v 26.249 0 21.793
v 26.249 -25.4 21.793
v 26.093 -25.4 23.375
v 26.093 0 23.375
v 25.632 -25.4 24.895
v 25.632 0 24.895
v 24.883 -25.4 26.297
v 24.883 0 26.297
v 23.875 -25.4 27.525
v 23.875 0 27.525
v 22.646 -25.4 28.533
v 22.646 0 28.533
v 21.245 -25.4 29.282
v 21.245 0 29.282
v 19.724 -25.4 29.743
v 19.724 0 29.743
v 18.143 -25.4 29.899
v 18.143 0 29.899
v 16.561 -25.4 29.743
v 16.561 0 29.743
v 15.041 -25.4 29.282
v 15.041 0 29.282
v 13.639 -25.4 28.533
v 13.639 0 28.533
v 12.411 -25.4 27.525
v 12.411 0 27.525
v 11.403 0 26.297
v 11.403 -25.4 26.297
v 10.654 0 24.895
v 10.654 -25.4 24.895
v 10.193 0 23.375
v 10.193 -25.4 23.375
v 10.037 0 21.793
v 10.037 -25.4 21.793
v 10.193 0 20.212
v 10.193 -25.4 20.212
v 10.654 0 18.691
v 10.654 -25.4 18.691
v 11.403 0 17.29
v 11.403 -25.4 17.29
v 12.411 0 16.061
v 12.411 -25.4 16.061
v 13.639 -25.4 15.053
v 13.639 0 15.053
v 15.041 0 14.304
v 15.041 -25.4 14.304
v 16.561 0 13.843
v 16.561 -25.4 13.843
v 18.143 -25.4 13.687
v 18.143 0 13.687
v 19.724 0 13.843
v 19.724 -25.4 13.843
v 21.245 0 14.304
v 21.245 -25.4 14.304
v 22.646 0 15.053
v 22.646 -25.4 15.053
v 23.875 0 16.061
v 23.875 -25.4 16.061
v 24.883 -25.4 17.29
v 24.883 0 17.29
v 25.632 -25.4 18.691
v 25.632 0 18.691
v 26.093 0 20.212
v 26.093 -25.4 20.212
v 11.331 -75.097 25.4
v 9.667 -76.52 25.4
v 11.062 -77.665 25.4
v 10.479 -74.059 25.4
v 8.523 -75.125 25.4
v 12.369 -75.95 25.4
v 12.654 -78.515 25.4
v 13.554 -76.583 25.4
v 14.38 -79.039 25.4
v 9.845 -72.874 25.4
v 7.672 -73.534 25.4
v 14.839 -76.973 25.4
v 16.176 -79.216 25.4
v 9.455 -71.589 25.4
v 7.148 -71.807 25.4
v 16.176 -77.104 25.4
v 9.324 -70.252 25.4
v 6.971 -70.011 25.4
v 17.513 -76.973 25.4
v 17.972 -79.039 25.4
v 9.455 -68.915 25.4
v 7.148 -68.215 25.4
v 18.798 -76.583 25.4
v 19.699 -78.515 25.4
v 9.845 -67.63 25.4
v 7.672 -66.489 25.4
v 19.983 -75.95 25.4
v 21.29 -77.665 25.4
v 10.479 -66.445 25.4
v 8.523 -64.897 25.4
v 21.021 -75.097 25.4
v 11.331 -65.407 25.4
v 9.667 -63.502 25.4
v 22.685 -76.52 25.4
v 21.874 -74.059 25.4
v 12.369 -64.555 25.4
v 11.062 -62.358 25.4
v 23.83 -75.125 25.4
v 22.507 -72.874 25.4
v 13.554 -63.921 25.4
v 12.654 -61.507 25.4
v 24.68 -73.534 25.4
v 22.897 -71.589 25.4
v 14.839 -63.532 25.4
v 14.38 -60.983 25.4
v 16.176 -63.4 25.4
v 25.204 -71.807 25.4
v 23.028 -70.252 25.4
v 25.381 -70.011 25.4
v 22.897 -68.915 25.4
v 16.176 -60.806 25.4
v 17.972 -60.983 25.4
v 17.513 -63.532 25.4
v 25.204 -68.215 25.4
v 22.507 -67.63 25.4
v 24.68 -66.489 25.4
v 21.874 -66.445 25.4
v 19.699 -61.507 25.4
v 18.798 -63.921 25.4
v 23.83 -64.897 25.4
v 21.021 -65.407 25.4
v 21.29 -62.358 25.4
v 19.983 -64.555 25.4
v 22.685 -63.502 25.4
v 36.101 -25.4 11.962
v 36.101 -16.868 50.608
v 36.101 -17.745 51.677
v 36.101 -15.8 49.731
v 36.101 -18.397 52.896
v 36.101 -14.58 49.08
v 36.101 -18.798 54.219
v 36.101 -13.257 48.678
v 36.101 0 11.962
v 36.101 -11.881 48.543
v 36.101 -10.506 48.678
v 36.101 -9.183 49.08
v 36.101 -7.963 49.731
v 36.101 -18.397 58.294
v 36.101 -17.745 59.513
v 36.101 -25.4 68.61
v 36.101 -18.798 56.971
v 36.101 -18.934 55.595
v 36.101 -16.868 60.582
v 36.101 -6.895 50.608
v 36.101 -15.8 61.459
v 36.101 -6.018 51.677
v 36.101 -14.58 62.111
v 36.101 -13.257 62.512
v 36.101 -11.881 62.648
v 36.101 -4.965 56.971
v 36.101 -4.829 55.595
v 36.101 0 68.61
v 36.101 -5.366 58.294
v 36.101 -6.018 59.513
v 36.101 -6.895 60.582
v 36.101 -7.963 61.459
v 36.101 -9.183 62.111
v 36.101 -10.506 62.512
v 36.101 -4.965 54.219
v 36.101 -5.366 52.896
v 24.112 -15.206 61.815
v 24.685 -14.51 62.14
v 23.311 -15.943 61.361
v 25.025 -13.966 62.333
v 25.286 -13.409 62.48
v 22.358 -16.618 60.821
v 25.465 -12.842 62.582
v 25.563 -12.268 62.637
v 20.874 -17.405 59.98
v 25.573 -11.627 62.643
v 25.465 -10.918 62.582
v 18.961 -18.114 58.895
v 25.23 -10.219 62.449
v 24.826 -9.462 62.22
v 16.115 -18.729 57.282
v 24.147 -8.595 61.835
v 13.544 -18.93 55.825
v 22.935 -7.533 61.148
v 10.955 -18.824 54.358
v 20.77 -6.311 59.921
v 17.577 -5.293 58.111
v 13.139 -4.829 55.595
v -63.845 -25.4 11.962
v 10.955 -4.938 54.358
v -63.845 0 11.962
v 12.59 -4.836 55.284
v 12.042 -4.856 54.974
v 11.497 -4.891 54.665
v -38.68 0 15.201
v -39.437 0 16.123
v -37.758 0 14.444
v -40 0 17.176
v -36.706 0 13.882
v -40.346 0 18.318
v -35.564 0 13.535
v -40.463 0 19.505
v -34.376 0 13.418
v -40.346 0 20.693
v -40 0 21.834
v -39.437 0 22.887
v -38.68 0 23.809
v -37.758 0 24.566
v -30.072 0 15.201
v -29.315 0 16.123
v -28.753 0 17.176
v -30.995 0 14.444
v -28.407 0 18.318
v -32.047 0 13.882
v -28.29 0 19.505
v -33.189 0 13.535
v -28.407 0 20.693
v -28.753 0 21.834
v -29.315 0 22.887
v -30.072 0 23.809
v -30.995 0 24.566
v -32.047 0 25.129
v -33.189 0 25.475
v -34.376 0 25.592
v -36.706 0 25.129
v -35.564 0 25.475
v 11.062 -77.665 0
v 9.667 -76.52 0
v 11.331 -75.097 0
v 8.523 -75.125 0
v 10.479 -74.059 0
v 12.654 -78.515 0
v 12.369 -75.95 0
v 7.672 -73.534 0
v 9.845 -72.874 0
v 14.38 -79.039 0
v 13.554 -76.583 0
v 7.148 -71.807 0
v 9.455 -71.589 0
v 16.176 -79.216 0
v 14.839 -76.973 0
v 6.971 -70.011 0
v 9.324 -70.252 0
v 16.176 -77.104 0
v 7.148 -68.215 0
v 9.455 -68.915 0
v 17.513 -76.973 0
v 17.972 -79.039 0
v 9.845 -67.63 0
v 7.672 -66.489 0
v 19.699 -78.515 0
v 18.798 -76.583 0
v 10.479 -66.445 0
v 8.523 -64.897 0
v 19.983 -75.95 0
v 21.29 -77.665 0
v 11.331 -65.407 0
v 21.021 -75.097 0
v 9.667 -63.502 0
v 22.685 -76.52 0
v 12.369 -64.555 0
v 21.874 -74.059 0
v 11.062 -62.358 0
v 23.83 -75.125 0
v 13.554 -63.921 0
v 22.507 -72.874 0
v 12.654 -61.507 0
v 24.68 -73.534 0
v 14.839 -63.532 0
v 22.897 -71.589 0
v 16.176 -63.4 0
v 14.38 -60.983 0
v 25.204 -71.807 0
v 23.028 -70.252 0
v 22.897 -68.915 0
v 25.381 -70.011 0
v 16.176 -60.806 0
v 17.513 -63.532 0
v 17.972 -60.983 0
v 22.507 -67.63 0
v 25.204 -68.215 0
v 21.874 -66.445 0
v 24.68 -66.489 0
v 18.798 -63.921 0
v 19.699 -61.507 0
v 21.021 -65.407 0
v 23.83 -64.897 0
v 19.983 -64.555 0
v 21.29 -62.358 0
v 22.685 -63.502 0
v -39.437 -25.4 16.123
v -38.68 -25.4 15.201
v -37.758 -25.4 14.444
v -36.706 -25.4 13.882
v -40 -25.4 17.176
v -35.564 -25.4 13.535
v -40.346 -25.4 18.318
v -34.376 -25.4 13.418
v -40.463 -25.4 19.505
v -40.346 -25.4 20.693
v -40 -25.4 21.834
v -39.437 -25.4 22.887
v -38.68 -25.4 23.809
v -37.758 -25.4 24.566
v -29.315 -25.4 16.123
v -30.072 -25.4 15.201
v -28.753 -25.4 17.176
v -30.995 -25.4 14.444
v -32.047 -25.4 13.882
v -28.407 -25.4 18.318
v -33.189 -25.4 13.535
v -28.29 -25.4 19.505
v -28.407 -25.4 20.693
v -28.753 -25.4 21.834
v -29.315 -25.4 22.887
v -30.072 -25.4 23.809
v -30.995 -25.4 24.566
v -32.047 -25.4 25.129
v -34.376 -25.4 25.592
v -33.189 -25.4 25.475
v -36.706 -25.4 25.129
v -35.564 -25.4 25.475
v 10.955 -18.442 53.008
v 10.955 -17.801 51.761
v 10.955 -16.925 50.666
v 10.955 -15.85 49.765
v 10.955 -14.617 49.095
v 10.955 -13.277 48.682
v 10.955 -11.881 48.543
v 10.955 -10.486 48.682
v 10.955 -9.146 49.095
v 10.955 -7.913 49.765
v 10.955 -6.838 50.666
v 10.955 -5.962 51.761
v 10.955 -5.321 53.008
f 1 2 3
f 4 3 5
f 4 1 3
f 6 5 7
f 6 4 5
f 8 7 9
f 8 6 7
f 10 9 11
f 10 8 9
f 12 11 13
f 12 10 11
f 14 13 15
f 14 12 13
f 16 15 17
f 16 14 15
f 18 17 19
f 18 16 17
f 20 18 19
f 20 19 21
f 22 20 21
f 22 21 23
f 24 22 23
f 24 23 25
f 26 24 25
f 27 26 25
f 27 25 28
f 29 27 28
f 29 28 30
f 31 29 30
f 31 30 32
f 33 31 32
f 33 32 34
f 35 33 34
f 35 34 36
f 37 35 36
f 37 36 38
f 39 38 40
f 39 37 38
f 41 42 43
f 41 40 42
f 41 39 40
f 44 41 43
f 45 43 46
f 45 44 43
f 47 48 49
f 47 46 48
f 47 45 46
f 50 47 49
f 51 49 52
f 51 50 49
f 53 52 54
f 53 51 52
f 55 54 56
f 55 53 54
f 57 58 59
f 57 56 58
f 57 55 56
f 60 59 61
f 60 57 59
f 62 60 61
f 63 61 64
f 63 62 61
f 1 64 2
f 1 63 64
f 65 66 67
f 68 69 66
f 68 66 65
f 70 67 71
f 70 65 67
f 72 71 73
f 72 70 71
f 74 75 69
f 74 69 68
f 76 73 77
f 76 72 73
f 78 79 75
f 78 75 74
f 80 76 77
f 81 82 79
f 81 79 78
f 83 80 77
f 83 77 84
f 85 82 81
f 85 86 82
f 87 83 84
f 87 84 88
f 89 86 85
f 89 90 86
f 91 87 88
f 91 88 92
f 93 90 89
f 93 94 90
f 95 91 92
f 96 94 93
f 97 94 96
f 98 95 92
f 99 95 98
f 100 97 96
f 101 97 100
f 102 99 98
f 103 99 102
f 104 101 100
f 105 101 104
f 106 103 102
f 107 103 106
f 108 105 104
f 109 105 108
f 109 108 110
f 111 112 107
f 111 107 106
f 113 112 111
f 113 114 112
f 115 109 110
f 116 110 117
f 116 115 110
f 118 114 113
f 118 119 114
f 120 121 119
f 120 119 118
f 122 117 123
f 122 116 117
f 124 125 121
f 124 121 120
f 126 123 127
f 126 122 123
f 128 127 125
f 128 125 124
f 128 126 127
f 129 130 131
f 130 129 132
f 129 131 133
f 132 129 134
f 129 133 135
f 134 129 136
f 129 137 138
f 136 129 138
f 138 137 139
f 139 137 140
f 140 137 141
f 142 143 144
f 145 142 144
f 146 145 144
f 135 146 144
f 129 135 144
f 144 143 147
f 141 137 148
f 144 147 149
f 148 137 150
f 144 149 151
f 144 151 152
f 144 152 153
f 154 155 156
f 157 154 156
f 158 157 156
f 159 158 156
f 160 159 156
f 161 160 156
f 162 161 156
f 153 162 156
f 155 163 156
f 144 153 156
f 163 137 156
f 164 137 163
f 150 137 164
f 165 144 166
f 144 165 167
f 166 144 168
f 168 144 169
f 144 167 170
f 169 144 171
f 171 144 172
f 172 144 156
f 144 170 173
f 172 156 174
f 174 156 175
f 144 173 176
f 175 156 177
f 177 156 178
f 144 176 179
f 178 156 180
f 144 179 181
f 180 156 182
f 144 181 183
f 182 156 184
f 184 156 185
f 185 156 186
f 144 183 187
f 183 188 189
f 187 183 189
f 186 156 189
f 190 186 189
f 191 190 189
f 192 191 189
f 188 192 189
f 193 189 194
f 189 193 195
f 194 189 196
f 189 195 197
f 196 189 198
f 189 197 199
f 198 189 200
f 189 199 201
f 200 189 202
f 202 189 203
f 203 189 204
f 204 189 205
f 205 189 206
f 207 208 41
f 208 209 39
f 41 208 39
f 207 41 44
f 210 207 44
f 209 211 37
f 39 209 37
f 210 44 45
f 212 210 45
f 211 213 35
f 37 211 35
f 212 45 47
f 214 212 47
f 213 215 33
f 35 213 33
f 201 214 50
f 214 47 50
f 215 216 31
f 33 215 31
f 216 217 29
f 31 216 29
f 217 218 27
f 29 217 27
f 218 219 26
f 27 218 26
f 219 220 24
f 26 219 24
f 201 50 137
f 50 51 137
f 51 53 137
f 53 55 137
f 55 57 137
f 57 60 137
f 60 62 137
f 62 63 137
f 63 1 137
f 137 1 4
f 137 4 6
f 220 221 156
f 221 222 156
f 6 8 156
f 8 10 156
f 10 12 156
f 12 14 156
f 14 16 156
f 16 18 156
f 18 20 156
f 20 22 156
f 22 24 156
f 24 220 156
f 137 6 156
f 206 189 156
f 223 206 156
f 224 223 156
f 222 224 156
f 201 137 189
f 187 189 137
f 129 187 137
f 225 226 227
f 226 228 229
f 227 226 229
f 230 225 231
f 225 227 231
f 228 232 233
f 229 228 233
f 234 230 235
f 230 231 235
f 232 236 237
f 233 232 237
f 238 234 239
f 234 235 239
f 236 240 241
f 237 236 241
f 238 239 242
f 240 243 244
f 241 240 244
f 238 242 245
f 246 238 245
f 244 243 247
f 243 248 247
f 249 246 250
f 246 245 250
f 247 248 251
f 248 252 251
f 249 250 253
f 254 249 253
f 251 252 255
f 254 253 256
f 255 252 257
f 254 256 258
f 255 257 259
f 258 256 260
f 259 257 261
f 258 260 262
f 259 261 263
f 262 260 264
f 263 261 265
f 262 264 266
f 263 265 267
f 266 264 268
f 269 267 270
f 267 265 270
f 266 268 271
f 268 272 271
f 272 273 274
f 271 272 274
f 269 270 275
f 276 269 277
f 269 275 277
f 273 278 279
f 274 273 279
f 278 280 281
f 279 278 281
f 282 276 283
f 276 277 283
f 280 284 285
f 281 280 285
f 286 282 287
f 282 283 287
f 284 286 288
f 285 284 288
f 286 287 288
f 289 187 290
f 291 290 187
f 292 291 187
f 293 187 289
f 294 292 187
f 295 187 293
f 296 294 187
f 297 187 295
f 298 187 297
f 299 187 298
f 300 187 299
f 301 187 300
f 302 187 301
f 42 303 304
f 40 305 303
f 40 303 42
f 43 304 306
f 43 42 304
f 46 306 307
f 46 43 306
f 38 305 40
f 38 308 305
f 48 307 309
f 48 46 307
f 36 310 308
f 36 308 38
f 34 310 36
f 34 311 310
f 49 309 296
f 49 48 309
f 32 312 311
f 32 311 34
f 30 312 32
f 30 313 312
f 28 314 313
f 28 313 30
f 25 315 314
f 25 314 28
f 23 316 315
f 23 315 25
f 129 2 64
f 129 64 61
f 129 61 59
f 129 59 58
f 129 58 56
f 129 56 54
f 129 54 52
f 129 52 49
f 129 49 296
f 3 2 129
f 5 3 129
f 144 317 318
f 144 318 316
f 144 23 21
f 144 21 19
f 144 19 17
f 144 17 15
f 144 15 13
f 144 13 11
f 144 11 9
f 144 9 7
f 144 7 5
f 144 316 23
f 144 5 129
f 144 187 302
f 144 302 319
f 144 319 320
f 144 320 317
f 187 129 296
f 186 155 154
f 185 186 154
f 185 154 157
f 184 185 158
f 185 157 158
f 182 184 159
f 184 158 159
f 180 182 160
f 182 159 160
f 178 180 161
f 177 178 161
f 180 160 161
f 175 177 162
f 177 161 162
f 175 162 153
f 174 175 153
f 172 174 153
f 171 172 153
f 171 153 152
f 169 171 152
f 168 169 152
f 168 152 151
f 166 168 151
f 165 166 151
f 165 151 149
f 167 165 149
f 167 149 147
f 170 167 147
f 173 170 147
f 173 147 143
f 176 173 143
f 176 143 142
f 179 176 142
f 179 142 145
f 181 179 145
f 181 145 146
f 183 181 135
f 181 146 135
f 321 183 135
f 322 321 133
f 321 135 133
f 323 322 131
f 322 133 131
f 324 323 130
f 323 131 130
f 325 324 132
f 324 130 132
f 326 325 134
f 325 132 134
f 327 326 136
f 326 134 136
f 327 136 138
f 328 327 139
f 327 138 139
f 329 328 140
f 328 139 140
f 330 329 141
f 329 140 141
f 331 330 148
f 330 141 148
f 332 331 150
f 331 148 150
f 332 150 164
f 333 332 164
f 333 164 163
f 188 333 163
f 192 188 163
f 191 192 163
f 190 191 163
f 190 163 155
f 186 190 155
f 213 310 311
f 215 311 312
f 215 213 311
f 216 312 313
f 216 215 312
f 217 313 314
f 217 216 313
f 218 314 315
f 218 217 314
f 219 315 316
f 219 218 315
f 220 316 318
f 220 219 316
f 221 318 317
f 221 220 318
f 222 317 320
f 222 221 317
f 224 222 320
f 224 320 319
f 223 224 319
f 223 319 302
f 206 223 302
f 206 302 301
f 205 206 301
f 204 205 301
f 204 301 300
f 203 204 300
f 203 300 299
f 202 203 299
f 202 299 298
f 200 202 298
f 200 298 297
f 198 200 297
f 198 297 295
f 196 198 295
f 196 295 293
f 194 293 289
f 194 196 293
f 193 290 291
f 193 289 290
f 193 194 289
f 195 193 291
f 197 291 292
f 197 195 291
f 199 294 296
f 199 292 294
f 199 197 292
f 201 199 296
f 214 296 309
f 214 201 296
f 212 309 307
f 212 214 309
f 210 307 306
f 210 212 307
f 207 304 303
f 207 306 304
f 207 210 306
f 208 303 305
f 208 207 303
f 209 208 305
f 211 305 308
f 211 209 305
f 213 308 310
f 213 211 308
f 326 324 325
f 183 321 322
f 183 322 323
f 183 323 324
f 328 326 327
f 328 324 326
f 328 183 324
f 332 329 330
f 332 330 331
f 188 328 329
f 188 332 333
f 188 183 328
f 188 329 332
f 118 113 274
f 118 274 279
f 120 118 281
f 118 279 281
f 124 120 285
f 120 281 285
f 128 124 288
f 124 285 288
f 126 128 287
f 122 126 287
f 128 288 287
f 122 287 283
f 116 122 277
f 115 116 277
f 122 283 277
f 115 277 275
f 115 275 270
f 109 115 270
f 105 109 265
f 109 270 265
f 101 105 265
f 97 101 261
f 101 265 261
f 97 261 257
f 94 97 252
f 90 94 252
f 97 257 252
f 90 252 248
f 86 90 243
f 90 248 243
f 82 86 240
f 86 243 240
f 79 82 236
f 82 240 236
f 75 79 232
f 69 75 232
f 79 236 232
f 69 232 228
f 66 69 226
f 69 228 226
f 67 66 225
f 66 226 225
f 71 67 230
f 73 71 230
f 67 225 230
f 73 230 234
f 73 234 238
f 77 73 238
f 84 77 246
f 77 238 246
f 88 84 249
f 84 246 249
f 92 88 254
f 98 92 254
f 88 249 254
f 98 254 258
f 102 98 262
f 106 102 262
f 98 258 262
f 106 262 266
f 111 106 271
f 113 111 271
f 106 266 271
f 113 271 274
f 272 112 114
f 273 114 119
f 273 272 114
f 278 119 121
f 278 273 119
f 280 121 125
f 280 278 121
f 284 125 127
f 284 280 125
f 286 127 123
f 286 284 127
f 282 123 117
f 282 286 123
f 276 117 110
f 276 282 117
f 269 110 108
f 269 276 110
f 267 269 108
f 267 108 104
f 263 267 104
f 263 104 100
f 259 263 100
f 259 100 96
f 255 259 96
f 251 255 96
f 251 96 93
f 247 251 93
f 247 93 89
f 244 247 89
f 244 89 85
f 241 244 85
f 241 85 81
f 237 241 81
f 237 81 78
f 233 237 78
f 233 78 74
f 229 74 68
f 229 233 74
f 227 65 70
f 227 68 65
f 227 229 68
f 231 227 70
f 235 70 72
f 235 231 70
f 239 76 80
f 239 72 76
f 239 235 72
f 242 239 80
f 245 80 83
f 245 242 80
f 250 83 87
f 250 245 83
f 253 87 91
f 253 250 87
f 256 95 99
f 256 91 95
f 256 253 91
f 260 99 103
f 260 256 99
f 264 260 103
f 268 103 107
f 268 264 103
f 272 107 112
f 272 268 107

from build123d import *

# Parameters (mm, degrees)
F1_DEPTH  = 25.4
F2_R      = 8.105972
F3_DEPTH  = 50.8
F2_R_2    = 6.086756
F4_DEPTH  = 50.8
F5_R      = 7.052488
F6_DEPTH  = 25.146
F7_R      = 9.204756
F8_DEPTH  = 25.4
F9_R      = 6.852263
F10_DEPTH = 29.464


with BuildPart() as f1:
    # F0 (on Front) → F1 (new body)
    with BuildSketch(Plane.XZ):
        Polygon((36.10063, 68.610115), (-63.844816, 11.961699), (36.10063, 11.961699), align=None)
    extrude(amount=F1_DEPTH)

    # F2 (on Front) → F3 (cut)
    with BuildSketch(Plane.XZ):
        with Locations((18.142877, 21.7932)):
            Circle(F2_R)
    extrude(amount=F3_DEPTH, mode=Mode.SUBTRACT)

    # F2 (on Front) → F4 (cut)
    with BuildSketch(Plane.XZ):
        with Locations((-34.37642, 19.505117)):
            Circle(F2_R_2)
    extrude(amount=F4_DEPTH, mode=Mode.SUBTRACT)

    # F5 (on face) → F6 (cut)
    with BuildSketch(Plane.YZ.offset(36.10063)):
        with Locations((-11.881486, 55.595338)):
            Circle(F5_R)
    extrude(amount=-F6_DEPTH, mode=Mode.SUBTRACT)


with BuildPart() as f8:
    # F7 (on Top) → F8 (new body)
    with BuildSketch(Plane.XY):
        with Locations((16.176064, -70.011124)):
            Circle(F7_R)
    extrude(amount=F8_DEPTH)

    # F9 (on Top) → F10 (cut)
    with BuildSketch(Plane.XY):
        with Locations((16.176064, -70.252106)):
            Circle(F9_R)
    extrude(amount=F10_DEPTH, mode=Mode.SUBTRACT)


solid = Compound([f1.part, f8.part])
